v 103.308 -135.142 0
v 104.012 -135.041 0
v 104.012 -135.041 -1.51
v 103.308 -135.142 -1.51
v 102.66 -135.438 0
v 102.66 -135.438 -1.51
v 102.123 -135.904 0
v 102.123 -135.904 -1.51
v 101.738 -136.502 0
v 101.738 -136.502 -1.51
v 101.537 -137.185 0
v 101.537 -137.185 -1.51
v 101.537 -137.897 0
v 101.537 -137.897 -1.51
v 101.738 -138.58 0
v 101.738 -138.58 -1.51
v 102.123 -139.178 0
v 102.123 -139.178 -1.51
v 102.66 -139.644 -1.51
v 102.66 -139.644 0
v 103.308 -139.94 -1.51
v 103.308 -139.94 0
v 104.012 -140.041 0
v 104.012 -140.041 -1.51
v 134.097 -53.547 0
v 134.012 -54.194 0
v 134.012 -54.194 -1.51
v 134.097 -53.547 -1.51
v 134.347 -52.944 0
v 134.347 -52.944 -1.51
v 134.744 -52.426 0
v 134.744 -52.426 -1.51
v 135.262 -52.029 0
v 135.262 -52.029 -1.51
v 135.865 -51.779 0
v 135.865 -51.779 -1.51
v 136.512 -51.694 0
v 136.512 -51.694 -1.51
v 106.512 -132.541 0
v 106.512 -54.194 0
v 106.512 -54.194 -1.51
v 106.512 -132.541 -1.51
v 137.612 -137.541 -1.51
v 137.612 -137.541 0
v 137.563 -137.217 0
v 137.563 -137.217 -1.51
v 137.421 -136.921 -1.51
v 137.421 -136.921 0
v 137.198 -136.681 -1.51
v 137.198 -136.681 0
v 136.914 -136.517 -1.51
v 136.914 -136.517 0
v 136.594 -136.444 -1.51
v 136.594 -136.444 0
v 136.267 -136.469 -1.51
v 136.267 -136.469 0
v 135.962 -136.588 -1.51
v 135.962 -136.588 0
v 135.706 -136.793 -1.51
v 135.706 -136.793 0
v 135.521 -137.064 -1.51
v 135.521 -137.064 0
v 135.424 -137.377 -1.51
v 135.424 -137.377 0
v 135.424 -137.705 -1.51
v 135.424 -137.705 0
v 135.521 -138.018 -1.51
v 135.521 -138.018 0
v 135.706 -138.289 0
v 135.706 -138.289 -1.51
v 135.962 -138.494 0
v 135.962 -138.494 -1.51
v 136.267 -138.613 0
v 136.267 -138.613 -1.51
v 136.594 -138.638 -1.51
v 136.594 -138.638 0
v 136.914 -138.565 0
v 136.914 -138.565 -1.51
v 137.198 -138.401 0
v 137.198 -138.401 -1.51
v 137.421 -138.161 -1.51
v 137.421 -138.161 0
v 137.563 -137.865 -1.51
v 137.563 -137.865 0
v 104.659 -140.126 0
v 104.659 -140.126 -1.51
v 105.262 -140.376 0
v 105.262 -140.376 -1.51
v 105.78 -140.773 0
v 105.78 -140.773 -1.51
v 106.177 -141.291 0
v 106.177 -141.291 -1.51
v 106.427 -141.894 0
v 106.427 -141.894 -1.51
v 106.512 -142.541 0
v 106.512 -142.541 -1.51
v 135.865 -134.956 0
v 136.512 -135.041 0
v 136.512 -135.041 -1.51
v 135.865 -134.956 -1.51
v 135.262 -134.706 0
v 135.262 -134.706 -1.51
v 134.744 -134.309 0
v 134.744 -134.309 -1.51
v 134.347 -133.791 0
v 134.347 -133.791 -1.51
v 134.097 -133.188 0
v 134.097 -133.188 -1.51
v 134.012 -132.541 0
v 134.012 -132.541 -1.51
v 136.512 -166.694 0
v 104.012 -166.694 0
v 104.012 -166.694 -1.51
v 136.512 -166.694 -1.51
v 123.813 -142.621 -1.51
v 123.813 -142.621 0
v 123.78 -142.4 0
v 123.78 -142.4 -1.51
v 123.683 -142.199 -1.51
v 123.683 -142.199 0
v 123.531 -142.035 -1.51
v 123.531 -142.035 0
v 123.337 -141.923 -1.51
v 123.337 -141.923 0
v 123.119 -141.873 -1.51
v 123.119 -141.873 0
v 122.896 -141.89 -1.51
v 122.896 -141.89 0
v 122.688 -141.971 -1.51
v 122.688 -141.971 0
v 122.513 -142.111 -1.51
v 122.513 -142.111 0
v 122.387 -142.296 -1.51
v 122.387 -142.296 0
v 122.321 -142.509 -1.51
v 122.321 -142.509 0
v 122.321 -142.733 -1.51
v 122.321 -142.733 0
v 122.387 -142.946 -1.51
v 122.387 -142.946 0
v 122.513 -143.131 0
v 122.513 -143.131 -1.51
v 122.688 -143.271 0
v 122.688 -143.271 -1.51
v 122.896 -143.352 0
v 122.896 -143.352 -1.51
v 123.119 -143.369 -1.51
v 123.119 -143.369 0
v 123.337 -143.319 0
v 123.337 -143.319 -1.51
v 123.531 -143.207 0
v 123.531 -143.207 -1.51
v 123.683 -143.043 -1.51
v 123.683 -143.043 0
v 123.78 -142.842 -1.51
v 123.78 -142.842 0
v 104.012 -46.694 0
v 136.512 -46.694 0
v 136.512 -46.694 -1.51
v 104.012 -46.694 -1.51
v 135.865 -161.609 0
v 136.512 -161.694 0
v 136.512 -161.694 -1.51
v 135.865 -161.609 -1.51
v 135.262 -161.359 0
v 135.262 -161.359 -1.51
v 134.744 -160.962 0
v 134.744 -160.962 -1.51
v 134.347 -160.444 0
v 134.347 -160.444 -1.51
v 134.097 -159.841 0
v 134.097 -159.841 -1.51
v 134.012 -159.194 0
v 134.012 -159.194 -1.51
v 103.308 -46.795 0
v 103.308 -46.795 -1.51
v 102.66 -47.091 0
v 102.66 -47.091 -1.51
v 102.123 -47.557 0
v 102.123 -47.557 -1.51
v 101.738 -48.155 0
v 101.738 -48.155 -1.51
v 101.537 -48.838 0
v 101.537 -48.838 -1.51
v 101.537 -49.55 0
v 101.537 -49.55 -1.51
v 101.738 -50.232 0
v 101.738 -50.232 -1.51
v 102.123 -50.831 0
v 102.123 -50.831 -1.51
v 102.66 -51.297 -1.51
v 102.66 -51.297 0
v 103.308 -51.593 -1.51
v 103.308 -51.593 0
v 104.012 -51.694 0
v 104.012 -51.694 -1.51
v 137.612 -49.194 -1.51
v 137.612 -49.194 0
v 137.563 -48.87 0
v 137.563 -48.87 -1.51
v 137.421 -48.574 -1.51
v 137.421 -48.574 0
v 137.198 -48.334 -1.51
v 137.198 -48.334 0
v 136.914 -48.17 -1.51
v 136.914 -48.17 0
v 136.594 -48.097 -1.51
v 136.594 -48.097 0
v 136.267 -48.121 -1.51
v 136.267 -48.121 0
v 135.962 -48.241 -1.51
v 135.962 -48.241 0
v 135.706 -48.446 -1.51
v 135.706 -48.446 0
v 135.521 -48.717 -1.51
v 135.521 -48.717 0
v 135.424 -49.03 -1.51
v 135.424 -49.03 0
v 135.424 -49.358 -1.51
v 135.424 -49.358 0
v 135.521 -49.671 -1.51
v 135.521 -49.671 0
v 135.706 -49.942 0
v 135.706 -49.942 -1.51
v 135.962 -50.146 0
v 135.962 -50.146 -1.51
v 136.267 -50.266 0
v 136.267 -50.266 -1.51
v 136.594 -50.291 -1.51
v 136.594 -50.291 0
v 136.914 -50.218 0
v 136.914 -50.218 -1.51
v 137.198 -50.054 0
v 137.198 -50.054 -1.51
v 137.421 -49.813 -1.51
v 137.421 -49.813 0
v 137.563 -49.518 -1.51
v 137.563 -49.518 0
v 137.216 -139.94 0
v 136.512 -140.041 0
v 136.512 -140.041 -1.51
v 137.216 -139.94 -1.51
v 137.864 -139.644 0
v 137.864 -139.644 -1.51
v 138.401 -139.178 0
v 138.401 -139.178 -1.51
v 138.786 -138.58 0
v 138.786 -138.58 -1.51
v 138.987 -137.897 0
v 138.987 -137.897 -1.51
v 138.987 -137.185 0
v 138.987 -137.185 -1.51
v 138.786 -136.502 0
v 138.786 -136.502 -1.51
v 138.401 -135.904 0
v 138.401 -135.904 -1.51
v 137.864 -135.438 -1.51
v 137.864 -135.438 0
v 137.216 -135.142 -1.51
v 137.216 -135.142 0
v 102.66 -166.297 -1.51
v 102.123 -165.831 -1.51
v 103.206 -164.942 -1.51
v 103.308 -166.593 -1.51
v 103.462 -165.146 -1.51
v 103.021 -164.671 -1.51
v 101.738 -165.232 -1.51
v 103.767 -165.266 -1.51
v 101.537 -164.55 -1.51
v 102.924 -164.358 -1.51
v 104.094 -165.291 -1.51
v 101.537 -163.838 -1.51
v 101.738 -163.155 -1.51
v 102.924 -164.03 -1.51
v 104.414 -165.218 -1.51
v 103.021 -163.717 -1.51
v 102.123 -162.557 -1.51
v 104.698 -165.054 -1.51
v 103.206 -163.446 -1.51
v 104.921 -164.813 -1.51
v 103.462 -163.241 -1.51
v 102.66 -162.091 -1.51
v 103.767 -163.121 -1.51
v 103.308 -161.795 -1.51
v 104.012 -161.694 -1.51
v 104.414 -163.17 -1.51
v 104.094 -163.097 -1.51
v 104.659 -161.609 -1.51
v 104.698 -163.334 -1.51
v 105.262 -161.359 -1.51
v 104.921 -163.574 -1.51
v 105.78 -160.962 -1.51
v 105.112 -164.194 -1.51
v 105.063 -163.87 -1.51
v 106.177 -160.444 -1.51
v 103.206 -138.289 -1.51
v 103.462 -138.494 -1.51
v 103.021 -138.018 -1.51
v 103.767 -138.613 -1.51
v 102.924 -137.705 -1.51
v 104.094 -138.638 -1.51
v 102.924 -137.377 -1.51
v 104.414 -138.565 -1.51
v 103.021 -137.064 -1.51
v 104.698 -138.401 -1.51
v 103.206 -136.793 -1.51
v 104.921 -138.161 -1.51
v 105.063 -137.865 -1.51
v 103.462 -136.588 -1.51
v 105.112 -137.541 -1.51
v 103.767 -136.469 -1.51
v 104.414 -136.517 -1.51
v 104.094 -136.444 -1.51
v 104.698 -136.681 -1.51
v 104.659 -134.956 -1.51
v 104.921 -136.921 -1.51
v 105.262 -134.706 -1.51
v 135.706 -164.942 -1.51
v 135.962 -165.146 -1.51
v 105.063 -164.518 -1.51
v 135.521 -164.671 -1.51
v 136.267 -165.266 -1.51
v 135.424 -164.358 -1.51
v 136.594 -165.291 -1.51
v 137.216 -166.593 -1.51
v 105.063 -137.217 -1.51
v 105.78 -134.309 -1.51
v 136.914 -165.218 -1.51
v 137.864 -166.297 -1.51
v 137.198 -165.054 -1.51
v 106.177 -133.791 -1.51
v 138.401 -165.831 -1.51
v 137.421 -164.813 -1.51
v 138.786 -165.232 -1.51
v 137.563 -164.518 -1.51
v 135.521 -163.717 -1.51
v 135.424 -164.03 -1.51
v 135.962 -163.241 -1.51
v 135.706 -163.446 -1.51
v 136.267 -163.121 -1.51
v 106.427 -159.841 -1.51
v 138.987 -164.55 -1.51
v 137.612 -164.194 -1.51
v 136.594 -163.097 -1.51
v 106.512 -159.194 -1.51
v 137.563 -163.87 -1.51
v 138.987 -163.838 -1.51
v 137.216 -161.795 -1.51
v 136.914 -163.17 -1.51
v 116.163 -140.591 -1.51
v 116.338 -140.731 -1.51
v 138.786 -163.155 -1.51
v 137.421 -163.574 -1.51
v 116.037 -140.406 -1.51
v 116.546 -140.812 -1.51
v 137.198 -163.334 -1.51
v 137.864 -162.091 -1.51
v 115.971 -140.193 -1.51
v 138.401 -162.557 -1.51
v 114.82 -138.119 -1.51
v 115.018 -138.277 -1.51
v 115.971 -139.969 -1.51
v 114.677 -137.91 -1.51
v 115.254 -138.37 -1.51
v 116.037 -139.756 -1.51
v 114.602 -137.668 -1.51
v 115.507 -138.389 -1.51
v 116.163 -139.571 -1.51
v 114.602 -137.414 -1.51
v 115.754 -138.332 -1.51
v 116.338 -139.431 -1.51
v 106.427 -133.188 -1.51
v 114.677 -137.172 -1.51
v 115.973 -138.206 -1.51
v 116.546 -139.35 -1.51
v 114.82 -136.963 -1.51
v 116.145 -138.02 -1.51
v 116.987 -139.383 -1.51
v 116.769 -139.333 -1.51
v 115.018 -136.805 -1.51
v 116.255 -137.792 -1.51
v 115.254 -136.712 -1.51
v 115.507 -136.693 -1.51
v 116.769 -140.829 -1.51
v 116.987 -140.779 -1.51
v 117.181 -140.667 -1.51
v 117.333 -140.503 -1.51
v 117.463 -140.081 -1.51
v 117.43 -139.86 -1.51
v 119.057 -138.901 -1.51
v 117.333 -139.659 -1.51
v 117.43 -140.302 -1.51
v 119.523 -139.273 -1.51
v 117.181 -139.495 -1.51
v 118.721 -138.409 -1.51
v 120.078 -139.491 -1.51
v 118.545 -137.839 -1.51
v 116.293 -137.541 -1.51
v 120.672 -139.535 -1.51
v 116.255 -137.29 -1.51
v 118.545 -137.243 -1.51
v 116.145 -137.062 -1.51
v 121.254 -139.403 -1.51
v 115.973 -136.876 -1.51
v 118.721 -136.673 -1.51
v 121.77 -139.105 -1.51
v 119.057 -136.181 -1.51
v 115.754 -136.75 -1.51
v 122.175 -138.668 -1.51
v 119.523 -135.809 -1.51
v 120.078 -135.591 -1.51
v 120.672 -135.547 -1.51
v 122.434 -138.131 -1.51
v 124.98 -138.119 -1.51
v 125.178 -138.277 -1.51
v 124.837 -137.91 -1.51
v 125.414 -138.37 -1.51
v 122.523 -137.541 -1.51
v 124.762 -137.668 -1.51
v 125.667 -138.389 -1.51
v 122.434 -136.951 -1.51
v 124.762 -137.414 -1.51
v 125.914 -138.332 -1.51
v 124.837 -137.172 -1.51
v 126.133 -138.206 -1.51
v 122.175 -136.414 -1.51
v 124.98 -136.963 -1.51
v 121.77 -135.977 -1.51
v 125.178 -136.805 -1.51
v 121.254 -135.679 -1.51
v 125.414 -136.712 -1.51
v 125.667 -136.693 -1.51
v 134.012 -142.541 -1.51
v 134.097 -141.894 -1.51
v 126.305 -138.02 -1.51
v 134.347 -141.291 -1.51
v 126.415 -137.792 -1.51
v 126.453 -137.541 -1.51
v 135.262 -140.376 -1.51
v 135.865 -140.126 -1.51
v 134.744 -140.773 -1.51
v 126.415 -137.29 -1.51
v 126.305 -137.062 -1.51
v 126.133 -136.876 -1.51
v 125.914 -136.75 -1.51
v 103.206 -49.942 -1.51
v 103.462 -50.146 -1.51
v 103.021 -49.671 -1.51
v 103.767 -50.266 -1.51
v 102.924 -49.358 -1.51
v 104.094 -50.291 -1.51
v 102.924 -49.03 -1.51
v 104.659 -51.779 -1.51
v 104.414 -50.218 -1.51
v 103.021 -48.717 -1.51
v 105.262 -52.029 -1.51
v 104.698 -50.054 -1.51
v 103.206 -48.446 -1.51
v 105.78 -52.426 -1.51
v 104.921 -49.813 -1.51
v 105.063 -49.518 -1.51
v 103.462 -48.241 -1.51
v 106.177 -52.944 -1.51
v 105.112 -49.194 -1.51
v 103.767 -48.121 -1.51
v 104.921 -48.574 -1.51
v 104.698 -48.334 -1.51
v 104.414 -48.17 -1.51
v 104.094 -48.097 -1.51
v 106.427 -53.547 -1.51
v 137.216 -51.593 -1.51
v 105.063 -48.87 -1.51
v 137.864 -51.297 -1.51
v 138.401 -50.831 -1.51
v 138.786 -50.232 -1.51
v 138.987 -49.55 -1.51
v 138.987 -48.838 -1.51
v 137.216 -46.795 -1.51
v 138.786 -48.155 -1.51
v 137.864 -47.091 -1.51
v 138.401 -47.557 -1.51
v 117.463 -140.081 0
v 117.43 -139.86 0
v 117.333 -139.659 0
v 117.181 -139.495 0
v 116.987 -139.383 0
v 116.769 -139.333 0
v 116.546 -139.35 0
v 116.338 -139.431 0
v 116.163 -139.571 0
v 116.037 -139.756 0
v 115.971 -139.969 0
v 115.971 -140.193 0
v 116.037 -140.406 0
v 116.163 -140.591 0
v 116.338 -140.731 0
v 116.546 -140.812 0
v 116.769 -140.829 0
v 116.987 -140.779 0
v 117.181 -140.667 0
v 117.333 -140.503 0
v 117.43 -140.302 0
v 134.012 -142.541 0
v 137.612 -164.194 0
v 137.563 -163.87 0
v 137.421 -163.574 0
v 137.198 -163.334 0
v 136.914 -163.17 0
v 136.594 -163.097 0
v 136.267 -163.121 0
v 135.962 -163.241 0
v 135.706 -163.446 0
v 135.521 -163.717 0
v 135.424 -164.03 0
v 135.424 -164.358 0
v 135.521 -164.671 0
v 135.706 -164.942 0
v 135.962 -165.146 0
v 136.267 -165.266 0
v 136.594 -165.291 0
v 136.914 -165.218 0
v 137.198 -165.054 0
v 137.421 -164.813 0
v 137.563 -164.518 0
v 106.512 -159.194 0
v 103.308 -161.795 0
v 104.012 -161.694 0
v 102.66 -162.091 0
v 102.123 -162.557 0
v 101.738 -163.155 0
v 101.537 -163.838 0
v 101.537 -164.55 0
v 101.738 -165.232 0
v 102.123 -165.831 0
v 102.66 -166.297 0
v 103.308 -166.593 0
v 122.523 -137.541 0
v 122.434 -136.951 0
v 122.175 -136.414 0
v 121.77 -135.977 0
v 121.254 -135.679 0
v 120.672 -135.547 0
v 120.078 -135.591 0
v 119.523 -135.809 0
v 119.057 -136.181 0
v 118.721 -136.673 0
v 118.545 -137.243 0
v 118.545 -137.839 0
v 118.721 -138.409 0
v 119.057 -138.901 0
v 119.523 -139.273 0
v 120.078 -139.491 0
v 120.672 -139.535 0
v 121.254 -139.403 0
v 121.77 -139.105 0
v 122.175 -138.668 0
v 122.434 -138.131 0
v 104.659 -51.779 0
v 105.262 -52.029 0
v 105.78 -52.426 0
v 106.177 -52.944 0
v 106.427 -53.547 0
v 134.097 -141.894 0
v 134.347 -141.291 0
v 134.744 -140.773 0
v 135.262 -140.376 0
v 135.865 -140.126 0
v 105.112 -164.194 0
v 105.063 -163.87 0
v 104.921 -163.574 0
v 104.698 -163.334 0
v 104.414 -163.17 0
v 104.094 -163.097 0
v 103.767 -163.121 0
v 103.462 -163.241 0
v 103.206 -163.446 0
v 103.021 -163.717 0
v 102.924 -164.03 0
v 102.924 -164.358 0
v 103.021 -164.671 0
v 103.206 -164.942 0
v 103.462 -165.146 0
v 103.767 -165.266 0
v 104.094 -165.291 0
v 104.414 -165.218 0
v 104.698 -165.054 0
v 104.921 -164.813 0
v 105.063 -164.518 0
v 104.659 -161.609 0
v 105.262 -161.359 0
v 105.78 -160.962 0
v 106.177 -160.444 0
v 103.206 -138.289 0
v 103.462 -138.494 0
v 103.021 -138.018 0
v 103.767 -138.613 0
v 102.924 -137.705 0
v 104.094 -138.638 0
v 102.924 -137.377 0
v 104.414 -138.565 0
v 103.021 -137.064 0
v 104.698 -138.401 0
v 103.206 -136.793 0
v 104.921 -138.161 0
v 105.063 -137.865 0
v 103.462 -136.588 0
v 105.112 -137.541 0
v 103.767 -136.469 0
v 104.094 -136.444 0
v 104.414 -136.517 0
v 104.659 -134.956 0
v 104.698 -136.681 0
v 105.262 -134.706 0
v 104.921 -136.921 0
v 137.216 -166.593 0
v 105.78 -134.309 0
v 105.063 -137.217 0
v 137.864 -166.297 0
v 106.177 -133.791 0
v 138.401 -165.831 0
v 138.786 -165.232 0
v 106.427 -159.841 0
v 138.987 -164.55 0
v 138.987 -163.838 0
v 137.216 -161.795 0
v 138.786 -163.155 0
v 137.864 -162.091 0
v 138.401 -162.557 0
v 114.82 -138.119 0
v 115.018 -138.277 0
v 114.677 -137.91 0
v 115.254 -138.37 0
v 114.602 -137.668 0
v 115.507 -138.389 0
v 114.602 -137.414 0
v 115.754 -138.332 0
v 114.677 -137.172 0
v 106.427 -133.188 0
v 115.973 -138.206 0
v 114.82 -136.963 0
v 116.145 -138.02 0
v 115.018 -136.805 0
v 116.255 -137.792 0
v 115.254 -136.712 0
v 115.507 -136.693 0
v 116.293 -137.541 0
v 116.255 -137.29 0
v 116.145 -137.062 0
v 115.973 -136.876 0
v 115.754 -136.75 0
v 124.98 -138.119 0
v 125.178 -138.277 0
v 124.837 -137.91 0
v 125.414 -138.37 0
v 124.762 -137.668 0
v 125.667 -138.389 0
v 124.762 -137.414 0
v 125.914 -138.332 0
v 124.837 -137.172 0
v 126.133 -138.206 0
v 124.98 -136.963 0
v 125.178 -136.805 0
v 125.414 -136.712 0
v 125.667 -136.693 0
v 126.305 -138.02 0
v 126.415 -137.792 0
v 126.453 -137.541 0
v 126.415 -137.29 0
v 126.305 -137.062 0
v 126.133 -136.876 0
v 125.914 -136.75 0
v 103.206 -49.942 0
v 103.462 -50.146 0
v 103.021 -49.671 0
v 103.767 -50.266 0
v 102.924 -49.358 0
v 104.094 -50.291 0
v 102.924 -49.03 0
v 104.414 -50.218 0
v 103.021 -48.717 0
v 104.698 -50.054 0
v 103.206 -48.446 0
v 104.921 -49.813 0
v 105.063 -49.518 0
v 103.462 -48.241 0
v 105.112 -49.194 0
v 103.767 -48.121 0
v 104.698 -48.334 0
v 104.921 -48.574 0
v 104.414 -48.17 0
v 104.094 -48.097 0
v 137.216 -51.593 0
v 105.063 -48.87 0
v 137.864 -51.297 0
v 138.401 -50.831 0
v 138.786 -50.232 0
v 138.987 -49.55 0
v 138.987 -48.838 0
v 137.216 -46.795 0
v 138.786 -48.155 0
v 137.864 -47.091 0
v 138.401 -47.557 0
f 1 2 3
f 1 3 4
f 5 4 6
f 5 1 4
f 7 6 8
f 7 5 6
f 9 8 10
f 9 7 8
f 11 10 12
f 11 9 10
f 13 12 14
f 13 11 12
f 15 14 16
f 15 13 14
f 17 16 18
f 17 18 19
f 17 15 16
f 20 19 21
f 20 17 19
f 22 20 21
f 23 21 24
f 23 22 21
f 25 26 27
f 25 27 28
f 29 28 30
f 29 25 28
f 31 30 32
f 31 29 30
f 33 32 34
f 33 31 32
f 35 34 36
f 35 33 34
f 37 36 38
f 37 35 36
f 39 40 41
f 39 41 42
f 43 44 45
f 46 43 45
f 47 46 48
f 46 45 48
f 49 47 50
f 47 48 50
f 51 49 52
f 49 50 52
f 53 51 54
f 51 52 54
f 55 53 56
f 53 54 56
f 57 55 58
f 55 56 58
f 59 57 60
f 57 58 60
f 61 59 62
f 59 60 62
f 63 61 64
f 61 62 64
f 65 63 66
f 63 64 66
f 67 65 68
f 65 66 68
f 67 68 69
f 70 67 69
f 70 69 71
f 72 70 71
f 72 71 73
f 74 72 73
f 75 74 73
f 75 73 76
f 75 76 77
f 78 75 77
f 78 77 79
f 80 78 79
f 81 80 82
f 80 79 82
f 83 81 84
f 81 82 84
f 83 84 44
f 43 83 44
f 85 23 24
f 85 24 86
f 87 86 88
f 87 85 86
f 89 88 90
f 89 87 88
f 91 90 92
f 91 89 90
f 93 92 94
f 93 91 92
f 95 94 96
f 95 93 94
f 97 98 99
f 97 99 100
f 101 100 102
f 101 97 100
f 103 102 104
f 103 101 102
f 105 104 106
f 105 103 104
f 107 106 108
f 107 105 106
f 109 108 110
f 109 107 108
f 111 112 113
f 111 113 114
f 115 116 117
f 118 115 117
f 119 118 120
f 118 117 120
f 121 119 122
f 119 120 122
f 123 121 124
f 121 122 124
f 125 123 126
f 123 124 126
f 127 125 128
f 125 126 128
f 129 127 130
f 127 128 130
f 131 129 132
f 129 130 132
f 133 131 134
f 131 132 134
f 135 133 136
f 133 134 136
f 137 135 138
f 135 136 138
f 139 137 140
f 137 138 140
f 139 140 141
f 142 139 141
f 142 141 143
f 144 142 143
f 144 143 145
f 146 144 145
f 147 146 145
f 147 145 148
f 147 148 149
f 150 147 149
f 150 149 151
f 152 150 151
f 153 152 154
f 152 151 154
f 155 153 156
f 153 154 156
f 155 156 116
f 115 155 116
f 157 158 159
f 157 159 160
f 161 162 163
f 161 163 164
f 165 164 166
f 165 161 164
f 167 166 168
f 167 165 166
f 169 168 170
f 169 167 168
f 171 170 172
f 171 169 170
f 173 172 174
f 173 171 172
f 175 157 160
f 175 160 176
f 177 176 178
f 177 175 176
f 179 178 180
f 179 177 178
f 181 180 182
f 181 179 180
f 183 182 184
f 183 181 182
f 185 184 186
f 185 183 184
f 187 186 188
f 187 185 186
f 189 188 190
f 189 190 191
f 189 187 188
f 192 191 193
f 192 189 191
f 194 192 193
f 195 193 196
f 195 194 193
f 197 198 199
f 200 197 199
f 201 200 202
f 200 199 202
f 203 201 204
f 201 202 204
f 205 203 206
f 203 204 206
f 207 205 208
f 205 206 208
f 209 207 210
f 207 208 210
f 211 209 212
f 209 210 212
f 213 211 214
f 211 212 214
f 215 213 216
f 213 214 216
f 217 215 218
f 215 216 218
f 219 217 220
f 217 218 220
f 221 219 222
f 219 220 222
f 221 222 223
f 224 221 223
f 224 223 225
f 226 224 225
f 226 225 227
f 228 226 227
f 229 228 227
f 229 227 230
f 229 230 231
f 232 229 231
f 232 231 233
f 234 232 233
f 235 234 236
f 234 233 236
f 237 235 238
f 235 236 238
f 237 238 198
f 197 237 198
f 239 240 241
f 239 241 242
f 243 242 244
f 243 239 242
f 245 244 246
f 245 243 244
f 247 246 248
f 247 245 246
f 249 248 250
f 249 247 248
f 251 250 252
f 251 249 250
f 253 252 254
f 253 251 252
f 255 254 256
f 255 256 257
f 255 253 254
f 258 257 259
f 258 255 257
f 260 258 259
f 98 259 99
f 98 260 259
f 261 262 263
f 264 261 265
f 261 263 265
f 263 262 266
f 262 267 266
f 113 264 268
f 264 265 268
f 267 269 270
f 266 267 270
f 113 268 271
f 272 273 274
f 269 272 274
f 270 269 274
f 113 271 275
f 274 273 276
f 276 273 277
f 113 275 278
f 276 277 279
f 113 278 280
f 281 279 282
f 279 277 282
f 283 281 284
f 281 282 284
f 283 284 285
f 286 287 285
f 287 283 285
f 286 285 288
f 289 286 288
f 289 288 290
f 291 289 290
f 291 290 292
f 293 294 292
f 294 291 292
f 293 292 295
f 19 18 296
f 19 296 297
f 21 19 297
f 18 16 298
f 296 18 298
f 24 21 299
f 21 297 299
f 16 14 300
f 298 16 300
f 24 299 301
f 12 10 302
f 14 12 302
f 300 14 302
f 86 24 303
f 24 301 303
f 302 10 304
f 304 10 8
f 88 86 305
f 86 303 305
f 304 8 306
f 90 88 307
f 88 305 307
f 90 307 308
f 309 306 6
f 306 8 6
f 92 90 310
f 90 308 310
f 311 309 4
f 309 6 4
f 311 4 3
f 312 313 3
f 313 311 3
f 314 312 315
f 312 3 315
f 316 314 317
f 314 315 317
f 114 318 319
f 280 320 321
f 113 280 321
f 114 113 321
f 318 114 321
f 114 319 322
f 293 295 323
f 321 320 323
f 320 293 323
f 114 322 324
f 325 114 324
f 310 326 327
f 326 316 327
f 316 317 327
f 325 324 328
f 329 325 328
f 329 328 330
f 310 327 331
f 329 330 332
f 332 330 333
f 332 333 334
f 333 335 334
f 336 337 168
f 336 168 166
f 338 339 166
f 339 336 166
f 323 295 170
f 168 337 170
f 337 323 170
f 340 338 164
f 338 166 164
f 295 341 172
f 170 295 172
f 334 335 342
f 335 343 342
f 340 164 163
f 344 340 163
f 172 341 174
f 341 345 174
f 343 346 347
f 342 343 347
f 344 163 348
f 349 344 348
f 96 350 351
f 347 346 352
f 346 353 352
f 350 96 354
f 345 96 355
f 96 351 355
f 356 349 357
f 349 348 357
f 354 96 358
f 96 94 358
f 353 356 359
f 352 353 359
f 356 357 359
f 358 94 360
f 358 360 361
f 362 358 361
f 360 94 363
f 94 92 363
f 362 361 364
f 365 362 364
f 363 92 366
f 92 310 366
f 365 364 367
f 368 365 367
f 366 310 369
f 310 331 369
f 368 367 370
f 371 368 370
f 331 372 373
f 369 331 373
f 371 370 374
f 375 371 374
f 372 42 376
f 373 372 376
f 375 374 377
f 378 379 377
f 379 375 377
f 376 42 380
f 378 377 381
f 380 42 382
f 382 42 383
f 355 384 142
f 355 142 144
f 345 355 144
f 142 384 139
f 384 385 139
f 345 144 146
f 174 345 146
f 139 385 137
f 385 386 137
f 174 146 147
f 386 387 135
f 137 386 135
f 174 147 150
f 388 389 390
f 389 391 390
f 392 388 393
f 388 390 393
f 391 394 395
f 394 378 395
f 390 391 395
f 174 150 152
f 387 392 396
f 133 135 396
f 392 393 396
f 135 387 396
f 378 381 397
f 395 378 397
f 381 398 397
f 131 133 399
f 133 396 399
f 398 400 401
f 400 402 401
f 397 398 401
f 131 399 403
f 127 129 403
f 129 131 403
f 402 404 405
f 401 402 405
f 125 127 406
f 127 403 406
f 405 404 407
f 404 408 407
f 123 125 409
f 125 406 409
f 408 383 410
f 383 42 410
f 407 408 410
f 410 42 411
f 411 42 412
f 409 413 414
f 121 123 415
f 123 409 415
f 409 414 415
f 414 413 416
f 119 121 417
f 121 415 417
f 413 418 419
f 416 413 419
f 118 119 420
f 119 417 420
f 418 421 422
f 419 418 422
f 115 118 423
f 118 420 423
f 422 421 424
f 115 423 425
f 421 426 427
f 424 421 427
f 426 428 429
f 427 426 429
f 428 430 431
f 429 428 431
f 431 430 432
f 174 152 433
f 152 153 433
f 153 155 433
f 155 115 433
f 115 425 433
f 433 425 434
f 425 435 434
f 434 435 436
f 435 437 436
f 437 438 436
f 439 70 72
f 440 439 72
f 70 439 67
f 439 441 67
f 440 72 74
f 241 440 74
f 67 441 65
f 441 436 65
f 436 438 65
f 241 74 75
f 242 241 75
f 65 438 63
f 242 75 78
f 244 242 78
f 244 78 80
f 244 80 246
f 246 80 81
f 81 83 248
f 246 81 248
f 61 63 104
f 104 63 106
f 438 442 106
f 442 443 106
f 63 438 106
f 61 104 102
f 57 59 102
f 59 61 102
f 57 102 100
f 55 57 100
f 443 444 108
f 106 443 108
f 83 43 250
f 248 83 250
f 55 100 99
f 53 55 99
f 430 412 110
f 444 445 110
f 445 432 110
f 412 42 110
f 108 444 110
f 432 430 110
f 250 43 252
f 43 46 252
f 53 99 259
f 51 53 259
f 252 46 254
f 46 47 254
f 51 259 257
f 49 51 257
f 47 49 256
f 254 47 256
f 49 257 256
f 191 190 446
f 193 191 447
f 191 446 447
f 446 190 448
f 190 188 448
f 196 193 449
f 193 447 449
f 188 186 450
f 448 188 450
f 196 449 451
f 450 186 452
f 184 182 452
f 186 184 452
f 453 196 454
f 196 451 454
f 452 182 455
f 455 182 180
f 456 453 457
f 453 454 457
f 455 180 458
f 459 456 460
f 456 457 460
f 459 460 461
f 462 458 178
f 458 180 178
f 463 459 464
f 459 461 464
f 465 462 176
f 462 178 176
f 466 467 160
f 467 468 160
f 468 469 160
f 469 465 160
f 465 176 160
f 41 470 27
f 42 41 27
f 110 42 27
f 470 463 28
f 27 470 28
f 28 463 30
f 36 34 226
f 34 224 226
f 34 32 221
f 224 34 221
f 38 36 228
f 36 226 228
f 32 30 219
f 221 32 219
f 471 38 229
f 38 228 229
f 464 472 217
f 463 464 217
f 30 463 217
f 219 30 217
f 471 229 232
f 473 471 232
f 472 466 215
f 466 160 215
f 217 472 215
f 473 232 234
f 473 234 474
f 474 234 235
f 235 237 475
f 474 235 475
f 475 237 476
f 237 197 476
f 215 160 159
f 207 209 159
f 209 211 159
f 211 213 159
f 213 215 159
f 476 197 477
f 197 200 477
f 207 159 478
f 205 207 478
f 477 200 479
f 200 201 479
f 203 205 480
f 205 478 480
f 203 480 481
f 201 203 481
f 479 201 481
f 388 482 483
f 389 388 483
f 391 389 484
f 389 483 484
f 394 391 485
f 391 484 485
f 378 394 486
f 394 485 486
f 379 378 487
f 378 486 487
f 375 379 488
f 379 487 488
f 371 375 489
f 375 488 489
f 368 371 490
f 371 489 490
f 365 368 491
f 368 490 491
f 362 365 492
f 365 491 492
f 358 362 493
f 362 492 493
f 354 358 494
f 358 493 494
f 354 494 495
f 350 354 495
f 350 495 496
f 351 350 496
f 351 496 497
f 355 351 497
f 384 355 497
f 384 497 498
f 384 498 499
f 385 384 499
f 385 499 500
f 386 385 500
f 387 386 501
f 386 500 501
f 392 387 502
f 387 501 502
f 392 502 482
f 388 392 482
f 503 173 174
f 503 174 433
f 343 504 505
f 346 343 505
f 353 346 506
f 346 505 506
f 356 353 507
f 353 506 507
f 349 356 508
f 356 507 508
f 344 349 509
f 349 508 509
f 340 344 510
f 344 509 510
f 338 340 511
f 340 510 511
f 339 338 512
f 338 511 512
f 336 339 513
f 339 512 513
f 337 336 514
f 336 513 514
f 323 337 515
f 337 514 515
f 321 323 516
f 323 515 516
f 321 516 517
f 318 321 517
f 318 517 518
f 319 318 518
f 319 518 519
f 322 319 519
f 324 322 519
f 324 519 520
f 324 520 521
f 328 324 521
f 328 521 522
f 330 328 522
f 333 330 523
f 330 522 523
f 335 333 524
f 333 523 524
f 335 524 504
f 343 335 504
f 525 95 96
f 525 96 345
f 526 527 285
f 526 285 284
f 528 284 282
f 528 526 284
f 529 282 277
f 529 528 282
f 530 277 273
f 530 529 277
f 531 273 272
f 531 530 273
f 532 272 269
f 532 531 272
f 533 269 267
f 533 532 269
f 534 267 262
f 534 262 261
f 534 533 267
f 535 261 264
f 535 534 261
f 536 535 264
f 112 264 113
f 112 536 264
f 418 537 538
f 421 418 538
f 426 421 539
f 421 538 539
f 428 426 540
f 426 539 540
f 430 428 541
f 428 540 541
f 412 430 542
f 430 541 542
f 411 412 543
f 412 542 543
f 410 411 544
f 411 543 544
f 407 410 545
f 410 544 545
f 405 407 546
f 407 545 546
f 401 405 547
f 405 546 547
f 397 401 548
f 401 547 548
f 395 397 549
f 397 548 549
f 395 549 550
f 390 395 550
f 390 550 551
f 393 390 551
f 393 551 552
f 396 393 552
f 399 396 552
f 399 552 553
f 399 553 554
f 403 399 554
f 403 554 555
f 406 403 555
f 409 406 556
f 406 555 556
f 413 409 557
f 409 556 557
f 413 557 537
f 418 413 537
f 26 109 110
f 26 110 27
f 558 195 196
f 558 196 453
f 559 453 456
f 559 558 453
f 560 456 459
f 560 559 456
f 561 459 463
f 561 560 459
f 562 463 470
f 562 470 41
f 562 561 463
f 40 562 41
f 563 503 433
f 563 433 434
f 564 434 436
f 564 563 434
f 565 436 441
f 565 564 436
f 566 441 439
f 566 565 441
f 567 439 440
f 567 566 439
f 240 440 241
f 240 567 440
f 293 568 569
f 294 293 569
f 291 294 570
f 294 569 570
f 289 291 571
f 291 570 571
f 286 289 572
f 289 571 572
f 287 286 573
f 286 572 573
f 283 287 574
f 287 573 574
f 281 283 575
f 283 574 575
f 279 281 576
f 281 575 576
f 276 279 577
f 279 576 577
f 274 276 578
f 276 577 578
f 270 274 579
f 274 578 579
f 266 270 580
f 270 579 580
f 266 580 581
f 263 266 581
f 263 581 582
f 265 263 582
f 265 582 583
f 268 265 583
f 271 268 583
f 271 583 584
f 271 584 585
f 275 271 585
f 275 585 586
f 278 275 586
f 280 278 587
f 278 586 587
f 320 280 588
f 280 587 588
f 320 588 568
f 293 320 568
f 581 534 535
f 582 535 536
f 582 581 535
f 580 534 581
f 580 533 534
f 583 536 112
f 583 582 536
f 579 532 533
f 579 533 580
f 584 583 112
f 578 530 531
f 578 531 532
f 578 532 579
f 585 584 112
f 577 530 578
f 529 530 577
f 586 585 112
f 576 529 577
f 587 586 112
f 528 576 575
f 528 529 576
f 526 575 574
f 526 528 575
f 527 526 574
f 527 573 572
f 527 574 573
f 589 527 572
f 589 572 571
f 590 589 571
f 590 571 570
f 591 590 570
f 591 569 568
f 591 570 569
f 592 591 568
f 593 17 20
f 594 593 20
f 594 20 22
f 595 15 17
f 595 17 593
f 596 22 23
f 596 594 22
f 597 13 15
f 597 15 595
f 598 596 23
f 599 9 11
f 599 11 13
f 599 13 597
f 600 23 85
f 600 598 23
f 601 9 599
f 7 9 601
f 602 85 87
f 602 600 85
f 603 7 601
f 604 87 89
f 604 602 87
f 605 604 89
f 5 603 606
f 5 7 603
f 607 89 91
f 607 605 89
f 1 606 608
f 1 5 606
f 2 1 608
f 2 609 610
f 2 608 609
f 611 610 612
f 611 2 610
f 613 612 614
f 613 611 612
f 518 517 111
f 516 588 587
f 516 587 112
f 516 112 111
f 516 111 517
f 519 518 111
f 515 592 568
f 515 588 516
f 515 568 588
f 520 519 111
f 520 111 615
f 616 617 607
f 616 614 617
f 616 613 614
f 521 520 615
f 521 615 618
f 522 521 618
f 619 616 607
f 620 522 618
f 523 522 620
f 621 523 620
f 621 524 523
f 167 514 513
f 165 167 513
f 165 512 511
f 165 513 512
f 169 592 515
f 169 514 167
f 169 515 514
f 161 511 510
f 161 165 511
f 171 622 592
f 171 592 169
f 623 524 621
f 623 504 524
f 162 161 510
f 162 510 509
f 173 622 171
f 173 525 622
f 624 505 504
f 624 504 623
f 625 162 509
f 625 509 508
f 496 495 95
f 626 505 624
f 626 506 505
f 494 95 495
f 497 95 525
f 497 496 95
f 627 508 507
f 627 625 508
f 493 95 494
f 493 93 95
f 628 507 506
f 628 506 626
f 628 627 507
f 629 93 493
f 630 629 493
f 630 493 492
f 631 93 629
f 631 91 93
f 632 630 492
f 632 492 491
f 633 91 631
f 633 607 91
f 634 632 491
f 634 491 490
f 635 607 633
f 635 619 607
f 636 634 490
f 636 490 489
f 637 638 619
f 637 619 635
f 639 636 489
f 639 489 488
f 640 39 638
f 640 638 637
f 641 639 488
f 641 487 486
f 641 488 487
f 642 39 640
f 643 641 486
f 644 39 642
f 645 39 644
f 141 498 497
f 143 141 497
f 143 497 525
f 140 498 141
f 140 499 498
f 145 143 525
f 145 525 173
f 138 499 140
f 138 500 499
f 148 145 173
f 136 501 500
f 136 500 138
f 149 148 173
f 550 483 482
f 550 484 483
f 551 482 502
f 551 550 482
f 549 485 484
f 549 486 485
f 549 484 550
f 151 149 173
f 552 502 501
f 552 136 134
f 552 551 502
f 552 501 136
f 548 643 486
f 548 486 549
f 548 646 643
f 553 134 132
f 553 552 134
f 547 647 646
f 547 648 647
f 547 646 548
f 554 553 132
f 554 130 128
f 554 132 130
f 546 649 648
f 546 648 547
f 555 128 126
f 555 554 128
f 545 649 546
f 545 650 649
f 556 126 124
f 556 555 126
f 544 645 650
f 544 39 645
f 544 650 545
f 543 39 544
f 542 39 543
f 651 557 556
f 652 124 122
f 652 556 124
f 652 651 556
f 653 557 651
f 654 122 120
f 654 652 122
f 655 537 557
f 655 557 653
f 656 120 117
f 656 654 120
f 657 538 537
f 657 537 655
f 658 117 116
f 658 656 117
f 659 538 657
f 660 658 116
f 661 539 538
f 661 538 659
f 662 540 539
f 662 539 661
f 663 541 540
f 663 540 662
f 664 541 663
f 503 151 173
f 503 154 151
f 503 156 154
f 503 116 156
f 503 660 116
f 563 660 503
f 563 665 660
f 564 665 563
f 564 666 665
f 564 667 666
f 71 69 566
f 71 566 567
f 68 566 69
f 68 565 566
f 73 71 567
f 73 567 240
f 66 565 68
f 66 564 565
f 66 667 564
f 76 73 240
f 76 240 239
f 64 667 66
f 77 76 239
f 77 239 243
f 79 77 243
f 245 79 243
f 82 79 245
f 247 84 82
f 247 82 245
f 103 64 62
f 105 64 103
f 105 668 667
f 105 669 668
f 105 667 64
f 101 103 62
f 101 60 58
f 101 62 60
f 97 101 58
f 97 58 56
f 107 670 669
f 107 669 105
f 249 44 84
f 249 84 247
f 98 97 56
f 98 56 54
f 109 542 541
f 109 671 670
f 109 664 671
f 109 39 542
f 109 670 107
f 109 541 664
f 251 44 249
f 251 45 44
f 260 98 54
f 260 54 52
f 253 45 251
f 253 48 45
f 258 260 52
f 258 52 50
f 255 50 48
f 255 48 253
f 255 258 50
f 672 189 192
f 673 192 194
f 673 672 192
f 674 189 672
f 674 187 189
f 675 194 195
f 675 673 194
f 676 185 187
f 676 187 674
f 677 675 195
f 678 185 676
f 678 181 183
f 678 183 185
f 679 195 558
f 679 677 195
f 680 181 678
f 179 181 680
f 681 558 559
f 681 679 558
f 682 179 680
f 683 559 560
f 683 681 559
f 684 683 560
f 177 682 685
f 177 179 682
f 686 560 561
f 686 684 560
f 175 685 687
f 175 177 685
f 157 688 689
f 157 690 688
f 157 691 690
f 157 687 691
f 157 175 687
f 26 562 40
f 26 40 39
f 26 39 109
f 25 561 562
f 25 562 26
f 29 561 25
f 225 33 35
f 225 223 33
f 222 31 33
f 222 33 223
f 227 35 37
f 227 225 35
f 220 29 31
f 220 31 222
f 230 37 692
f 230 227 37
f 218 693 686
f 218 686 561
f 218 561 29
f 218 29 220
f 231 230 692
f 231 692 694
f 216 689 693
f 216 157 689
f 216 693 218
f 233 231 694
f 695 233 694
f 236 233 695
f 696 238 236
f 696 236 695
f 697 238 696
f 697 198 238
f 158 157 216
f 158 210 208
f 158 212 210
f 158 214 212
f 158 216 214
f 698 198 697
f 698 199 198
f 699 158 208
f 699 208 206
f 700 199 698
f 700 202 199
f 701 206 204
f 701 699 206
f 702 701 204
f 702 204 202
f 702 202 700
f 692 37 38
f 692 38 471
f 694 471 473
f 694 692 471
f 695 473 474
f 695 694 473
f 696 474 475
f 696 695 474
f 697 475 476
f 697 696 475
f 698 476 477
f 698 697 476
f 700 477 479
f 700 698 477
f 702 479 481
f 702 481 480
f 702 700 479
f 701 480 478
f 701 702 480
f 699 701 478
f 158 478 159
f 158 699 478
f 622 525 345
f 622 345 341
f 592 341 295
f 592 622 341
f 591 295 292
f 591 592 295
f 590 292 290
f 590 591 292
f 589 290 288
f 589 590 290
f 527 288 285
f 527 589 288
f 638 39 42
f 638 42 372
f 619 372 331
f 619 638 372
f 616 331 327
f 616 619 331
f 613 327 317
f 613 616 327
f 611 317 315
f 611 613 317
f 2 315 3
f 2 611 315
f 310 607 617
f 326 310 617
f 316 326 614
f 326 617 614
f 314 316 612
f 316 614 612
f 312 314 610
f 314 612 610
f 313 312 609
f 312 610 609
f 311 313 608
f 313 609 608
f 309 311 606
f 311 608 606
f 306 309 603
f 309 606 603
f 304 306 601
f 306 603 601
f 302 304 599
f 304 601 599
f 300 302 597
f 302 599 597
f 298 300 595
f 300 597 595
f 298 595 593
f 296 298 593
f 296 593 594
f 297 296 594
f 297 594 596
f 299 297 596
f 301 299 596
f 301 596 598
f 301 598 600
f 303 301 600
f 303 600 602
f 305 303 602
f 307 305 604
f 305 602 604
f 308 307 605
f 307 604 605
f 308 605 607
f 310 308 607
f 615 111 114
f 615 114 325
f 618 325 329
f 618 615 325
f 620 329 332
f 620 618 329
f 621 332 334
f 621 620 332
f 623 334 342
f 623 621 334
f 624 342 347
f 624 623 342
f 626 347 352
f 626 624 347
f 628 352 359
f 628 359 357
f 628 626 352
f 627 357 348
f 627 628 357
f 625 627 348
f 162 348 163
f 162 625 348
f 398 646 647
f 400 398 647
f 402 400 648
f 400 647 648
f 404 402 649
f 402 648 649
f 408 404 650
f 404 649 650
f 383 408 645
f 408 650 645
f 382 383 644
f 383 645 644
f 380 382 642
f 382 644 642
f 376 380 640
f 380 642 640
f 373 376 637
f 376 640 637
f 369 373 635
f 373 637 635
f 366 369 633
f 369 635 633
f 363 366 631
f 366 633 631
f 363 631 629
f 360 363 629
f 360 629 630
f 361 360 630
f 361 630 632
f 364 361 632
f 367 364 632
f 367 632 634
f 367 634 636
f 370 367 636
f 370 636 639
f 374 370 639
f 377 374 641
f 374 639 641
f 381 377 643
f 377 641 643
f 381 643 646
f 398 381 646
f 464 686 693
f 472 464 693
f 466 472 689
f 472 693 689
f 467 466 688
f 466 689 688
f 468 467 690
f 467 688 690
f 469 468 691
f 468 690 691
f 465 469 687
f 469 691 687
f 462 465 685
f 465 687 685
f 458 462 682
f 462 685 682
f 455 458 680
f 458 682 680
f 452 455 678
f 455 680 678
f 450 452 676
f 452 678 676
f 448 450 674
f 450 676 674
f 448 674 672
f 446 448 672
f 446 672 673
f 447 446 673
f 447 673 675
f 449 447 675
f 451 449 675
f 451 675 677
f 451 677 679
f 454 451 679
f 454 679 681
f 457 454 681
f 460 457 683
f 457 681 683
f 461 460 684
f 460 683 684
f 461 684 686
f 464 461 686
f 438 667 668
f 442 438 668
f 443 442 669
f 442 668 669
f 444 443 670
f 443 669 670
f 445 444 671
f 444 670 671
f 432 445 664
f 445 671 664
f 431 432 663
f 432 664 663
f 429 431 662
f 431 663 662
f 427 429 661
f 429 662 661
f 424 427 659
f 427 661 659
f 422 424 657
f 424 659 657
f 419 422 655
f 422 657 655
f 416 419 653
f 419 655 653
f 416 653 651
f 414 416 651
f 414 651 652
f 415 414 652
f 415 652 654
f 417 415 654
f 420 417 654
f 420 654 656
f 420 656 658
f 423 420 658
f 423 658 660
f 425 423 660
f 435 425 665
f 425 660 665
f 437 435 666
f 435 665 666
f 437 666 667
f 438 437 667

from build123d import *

# Parameters (mm, degrees)
SKETCH1_R           = 0.85
SKETCH1_R_2         = 2
SKETCH1_R_3         = 0.75
SKETCH1_R_4         = 1.1
BOSS_EXTRUDE1_DEPTH = 1.51


with BuildPart() as part:
    # Sketch1 → Boss-Extrude1 (new body)
    with BuildSketch(Plane.XY):
        with BuildLine():
            Line((136.512, -46.6938), (104.012, -46.6938))
            ThreePointArc((104.012, -46.6938), (101.512, -49.1938), (104.012, -51.6938))
            ThreePointArc((104.012, -51.6938), (105.779767, -52.426033), (106.512, -54.1938))
            Line((106.512, -54.1938), (106.512, -132.541))
            ThreePointArc((106.512, -132.541), (105.779767, -134.308767), (104.012, -135.041))
            ThreePointArc((104.012, -135.041), (101.512, -137.541), (104.012, -140.041))
            ThreePointArc((104.012, -140.041), (105.779767, -140.773233), (106.512, -142.541))
            Line((106.512, -142.541), (106.512, -159.1938))
            ThreePointArc((106.512, -159.1938), (105.779767, -160.961567), (104.012, -161.6938))
            ThreePointArc((104.012, -161.6938), (101.512, -164.1938), (104.012, -166.6938))
            Line((104.012, -166.6938), (136.512, -166.6938))
            ThreePointArc((136.512, -166.6938), (139.012, -164.1938), (136.512, -161.6938))
            ThreePointArc((136.512, -161.6938), (134.744233, -160.961567), (134.012, -159.1938))
            Line((134.012, -159.1938), (134.012, -142.541))
            ThreePointArc((134.012, -142.541), (134.744233, -140.773233), (136.512, -140.041))
            ThreePointArc((136.512, -140.041), (139.012, -137.541), (136.512, -135.041))
            ThreePointArc((136.512, -135.041), (134.744233, -134.308767), (134.012, -132.541))
            Line((134.012, -132.541), (134.012, -54.1938))
            ThreePointArc((134.012, -54.1938), (134.744233, -52.426033), (136.512, -51.6938))
            ThreePointArc((136.512, -51.6938), (139.012, -49.1938), (136.512, -46.6938))
        make_face()
        with Locations((125.603, -137.541)):
            Circle(SKETCH1_R, mode=Mode.SUBTRACT)
        with Locations((120.523, -137.541)):
            Circle(SKETCH1_R_2, mode=Mode.SUBTRACT)
        with Locations((115.443, -137.541)):
            Circle(SKETCH1_R, mode=Mode.SUBTRACT)
        with Locations((116.713, -140.081)):
            Circle(SKETCH1_R_3, mode=Mode.SUBTRACT)
        with Locations((123.063, -142.621)):
            Circle(SKETCH1_R_3, mode=Mode.SUBTRACT)
        with Locations((104.012, -137.541)):
            Circle(SKETCH1_R_4, mode=Mode.SUBTRACT)
        with Locations((104.012, -164.1938)):
            Circle(SKETCH1_R_4, mode=Mode.SUBTRACT)
        with Locations((136.512, -164.1938)):
            Circle(SKETCH1_R_4, mode=Mode.SUBTRACT)
        with Locations((136.512, -137.541)):
            Circle(SKETCH1_R_4, mode=Mode.SUBTRACT)
        with Locations((136.512, -49.1938)):
            Circle(SKETCH1_R_4, mode=Mode.SUBTRACT)
        with Locations((104.012, -49.1938)):
            Circle(SKETCH1_R_4, mode=Mode.SUBTRACT)
    extrude(amount=-BOSS_EXTRUDE1_DEPTH)


solid = part.part
